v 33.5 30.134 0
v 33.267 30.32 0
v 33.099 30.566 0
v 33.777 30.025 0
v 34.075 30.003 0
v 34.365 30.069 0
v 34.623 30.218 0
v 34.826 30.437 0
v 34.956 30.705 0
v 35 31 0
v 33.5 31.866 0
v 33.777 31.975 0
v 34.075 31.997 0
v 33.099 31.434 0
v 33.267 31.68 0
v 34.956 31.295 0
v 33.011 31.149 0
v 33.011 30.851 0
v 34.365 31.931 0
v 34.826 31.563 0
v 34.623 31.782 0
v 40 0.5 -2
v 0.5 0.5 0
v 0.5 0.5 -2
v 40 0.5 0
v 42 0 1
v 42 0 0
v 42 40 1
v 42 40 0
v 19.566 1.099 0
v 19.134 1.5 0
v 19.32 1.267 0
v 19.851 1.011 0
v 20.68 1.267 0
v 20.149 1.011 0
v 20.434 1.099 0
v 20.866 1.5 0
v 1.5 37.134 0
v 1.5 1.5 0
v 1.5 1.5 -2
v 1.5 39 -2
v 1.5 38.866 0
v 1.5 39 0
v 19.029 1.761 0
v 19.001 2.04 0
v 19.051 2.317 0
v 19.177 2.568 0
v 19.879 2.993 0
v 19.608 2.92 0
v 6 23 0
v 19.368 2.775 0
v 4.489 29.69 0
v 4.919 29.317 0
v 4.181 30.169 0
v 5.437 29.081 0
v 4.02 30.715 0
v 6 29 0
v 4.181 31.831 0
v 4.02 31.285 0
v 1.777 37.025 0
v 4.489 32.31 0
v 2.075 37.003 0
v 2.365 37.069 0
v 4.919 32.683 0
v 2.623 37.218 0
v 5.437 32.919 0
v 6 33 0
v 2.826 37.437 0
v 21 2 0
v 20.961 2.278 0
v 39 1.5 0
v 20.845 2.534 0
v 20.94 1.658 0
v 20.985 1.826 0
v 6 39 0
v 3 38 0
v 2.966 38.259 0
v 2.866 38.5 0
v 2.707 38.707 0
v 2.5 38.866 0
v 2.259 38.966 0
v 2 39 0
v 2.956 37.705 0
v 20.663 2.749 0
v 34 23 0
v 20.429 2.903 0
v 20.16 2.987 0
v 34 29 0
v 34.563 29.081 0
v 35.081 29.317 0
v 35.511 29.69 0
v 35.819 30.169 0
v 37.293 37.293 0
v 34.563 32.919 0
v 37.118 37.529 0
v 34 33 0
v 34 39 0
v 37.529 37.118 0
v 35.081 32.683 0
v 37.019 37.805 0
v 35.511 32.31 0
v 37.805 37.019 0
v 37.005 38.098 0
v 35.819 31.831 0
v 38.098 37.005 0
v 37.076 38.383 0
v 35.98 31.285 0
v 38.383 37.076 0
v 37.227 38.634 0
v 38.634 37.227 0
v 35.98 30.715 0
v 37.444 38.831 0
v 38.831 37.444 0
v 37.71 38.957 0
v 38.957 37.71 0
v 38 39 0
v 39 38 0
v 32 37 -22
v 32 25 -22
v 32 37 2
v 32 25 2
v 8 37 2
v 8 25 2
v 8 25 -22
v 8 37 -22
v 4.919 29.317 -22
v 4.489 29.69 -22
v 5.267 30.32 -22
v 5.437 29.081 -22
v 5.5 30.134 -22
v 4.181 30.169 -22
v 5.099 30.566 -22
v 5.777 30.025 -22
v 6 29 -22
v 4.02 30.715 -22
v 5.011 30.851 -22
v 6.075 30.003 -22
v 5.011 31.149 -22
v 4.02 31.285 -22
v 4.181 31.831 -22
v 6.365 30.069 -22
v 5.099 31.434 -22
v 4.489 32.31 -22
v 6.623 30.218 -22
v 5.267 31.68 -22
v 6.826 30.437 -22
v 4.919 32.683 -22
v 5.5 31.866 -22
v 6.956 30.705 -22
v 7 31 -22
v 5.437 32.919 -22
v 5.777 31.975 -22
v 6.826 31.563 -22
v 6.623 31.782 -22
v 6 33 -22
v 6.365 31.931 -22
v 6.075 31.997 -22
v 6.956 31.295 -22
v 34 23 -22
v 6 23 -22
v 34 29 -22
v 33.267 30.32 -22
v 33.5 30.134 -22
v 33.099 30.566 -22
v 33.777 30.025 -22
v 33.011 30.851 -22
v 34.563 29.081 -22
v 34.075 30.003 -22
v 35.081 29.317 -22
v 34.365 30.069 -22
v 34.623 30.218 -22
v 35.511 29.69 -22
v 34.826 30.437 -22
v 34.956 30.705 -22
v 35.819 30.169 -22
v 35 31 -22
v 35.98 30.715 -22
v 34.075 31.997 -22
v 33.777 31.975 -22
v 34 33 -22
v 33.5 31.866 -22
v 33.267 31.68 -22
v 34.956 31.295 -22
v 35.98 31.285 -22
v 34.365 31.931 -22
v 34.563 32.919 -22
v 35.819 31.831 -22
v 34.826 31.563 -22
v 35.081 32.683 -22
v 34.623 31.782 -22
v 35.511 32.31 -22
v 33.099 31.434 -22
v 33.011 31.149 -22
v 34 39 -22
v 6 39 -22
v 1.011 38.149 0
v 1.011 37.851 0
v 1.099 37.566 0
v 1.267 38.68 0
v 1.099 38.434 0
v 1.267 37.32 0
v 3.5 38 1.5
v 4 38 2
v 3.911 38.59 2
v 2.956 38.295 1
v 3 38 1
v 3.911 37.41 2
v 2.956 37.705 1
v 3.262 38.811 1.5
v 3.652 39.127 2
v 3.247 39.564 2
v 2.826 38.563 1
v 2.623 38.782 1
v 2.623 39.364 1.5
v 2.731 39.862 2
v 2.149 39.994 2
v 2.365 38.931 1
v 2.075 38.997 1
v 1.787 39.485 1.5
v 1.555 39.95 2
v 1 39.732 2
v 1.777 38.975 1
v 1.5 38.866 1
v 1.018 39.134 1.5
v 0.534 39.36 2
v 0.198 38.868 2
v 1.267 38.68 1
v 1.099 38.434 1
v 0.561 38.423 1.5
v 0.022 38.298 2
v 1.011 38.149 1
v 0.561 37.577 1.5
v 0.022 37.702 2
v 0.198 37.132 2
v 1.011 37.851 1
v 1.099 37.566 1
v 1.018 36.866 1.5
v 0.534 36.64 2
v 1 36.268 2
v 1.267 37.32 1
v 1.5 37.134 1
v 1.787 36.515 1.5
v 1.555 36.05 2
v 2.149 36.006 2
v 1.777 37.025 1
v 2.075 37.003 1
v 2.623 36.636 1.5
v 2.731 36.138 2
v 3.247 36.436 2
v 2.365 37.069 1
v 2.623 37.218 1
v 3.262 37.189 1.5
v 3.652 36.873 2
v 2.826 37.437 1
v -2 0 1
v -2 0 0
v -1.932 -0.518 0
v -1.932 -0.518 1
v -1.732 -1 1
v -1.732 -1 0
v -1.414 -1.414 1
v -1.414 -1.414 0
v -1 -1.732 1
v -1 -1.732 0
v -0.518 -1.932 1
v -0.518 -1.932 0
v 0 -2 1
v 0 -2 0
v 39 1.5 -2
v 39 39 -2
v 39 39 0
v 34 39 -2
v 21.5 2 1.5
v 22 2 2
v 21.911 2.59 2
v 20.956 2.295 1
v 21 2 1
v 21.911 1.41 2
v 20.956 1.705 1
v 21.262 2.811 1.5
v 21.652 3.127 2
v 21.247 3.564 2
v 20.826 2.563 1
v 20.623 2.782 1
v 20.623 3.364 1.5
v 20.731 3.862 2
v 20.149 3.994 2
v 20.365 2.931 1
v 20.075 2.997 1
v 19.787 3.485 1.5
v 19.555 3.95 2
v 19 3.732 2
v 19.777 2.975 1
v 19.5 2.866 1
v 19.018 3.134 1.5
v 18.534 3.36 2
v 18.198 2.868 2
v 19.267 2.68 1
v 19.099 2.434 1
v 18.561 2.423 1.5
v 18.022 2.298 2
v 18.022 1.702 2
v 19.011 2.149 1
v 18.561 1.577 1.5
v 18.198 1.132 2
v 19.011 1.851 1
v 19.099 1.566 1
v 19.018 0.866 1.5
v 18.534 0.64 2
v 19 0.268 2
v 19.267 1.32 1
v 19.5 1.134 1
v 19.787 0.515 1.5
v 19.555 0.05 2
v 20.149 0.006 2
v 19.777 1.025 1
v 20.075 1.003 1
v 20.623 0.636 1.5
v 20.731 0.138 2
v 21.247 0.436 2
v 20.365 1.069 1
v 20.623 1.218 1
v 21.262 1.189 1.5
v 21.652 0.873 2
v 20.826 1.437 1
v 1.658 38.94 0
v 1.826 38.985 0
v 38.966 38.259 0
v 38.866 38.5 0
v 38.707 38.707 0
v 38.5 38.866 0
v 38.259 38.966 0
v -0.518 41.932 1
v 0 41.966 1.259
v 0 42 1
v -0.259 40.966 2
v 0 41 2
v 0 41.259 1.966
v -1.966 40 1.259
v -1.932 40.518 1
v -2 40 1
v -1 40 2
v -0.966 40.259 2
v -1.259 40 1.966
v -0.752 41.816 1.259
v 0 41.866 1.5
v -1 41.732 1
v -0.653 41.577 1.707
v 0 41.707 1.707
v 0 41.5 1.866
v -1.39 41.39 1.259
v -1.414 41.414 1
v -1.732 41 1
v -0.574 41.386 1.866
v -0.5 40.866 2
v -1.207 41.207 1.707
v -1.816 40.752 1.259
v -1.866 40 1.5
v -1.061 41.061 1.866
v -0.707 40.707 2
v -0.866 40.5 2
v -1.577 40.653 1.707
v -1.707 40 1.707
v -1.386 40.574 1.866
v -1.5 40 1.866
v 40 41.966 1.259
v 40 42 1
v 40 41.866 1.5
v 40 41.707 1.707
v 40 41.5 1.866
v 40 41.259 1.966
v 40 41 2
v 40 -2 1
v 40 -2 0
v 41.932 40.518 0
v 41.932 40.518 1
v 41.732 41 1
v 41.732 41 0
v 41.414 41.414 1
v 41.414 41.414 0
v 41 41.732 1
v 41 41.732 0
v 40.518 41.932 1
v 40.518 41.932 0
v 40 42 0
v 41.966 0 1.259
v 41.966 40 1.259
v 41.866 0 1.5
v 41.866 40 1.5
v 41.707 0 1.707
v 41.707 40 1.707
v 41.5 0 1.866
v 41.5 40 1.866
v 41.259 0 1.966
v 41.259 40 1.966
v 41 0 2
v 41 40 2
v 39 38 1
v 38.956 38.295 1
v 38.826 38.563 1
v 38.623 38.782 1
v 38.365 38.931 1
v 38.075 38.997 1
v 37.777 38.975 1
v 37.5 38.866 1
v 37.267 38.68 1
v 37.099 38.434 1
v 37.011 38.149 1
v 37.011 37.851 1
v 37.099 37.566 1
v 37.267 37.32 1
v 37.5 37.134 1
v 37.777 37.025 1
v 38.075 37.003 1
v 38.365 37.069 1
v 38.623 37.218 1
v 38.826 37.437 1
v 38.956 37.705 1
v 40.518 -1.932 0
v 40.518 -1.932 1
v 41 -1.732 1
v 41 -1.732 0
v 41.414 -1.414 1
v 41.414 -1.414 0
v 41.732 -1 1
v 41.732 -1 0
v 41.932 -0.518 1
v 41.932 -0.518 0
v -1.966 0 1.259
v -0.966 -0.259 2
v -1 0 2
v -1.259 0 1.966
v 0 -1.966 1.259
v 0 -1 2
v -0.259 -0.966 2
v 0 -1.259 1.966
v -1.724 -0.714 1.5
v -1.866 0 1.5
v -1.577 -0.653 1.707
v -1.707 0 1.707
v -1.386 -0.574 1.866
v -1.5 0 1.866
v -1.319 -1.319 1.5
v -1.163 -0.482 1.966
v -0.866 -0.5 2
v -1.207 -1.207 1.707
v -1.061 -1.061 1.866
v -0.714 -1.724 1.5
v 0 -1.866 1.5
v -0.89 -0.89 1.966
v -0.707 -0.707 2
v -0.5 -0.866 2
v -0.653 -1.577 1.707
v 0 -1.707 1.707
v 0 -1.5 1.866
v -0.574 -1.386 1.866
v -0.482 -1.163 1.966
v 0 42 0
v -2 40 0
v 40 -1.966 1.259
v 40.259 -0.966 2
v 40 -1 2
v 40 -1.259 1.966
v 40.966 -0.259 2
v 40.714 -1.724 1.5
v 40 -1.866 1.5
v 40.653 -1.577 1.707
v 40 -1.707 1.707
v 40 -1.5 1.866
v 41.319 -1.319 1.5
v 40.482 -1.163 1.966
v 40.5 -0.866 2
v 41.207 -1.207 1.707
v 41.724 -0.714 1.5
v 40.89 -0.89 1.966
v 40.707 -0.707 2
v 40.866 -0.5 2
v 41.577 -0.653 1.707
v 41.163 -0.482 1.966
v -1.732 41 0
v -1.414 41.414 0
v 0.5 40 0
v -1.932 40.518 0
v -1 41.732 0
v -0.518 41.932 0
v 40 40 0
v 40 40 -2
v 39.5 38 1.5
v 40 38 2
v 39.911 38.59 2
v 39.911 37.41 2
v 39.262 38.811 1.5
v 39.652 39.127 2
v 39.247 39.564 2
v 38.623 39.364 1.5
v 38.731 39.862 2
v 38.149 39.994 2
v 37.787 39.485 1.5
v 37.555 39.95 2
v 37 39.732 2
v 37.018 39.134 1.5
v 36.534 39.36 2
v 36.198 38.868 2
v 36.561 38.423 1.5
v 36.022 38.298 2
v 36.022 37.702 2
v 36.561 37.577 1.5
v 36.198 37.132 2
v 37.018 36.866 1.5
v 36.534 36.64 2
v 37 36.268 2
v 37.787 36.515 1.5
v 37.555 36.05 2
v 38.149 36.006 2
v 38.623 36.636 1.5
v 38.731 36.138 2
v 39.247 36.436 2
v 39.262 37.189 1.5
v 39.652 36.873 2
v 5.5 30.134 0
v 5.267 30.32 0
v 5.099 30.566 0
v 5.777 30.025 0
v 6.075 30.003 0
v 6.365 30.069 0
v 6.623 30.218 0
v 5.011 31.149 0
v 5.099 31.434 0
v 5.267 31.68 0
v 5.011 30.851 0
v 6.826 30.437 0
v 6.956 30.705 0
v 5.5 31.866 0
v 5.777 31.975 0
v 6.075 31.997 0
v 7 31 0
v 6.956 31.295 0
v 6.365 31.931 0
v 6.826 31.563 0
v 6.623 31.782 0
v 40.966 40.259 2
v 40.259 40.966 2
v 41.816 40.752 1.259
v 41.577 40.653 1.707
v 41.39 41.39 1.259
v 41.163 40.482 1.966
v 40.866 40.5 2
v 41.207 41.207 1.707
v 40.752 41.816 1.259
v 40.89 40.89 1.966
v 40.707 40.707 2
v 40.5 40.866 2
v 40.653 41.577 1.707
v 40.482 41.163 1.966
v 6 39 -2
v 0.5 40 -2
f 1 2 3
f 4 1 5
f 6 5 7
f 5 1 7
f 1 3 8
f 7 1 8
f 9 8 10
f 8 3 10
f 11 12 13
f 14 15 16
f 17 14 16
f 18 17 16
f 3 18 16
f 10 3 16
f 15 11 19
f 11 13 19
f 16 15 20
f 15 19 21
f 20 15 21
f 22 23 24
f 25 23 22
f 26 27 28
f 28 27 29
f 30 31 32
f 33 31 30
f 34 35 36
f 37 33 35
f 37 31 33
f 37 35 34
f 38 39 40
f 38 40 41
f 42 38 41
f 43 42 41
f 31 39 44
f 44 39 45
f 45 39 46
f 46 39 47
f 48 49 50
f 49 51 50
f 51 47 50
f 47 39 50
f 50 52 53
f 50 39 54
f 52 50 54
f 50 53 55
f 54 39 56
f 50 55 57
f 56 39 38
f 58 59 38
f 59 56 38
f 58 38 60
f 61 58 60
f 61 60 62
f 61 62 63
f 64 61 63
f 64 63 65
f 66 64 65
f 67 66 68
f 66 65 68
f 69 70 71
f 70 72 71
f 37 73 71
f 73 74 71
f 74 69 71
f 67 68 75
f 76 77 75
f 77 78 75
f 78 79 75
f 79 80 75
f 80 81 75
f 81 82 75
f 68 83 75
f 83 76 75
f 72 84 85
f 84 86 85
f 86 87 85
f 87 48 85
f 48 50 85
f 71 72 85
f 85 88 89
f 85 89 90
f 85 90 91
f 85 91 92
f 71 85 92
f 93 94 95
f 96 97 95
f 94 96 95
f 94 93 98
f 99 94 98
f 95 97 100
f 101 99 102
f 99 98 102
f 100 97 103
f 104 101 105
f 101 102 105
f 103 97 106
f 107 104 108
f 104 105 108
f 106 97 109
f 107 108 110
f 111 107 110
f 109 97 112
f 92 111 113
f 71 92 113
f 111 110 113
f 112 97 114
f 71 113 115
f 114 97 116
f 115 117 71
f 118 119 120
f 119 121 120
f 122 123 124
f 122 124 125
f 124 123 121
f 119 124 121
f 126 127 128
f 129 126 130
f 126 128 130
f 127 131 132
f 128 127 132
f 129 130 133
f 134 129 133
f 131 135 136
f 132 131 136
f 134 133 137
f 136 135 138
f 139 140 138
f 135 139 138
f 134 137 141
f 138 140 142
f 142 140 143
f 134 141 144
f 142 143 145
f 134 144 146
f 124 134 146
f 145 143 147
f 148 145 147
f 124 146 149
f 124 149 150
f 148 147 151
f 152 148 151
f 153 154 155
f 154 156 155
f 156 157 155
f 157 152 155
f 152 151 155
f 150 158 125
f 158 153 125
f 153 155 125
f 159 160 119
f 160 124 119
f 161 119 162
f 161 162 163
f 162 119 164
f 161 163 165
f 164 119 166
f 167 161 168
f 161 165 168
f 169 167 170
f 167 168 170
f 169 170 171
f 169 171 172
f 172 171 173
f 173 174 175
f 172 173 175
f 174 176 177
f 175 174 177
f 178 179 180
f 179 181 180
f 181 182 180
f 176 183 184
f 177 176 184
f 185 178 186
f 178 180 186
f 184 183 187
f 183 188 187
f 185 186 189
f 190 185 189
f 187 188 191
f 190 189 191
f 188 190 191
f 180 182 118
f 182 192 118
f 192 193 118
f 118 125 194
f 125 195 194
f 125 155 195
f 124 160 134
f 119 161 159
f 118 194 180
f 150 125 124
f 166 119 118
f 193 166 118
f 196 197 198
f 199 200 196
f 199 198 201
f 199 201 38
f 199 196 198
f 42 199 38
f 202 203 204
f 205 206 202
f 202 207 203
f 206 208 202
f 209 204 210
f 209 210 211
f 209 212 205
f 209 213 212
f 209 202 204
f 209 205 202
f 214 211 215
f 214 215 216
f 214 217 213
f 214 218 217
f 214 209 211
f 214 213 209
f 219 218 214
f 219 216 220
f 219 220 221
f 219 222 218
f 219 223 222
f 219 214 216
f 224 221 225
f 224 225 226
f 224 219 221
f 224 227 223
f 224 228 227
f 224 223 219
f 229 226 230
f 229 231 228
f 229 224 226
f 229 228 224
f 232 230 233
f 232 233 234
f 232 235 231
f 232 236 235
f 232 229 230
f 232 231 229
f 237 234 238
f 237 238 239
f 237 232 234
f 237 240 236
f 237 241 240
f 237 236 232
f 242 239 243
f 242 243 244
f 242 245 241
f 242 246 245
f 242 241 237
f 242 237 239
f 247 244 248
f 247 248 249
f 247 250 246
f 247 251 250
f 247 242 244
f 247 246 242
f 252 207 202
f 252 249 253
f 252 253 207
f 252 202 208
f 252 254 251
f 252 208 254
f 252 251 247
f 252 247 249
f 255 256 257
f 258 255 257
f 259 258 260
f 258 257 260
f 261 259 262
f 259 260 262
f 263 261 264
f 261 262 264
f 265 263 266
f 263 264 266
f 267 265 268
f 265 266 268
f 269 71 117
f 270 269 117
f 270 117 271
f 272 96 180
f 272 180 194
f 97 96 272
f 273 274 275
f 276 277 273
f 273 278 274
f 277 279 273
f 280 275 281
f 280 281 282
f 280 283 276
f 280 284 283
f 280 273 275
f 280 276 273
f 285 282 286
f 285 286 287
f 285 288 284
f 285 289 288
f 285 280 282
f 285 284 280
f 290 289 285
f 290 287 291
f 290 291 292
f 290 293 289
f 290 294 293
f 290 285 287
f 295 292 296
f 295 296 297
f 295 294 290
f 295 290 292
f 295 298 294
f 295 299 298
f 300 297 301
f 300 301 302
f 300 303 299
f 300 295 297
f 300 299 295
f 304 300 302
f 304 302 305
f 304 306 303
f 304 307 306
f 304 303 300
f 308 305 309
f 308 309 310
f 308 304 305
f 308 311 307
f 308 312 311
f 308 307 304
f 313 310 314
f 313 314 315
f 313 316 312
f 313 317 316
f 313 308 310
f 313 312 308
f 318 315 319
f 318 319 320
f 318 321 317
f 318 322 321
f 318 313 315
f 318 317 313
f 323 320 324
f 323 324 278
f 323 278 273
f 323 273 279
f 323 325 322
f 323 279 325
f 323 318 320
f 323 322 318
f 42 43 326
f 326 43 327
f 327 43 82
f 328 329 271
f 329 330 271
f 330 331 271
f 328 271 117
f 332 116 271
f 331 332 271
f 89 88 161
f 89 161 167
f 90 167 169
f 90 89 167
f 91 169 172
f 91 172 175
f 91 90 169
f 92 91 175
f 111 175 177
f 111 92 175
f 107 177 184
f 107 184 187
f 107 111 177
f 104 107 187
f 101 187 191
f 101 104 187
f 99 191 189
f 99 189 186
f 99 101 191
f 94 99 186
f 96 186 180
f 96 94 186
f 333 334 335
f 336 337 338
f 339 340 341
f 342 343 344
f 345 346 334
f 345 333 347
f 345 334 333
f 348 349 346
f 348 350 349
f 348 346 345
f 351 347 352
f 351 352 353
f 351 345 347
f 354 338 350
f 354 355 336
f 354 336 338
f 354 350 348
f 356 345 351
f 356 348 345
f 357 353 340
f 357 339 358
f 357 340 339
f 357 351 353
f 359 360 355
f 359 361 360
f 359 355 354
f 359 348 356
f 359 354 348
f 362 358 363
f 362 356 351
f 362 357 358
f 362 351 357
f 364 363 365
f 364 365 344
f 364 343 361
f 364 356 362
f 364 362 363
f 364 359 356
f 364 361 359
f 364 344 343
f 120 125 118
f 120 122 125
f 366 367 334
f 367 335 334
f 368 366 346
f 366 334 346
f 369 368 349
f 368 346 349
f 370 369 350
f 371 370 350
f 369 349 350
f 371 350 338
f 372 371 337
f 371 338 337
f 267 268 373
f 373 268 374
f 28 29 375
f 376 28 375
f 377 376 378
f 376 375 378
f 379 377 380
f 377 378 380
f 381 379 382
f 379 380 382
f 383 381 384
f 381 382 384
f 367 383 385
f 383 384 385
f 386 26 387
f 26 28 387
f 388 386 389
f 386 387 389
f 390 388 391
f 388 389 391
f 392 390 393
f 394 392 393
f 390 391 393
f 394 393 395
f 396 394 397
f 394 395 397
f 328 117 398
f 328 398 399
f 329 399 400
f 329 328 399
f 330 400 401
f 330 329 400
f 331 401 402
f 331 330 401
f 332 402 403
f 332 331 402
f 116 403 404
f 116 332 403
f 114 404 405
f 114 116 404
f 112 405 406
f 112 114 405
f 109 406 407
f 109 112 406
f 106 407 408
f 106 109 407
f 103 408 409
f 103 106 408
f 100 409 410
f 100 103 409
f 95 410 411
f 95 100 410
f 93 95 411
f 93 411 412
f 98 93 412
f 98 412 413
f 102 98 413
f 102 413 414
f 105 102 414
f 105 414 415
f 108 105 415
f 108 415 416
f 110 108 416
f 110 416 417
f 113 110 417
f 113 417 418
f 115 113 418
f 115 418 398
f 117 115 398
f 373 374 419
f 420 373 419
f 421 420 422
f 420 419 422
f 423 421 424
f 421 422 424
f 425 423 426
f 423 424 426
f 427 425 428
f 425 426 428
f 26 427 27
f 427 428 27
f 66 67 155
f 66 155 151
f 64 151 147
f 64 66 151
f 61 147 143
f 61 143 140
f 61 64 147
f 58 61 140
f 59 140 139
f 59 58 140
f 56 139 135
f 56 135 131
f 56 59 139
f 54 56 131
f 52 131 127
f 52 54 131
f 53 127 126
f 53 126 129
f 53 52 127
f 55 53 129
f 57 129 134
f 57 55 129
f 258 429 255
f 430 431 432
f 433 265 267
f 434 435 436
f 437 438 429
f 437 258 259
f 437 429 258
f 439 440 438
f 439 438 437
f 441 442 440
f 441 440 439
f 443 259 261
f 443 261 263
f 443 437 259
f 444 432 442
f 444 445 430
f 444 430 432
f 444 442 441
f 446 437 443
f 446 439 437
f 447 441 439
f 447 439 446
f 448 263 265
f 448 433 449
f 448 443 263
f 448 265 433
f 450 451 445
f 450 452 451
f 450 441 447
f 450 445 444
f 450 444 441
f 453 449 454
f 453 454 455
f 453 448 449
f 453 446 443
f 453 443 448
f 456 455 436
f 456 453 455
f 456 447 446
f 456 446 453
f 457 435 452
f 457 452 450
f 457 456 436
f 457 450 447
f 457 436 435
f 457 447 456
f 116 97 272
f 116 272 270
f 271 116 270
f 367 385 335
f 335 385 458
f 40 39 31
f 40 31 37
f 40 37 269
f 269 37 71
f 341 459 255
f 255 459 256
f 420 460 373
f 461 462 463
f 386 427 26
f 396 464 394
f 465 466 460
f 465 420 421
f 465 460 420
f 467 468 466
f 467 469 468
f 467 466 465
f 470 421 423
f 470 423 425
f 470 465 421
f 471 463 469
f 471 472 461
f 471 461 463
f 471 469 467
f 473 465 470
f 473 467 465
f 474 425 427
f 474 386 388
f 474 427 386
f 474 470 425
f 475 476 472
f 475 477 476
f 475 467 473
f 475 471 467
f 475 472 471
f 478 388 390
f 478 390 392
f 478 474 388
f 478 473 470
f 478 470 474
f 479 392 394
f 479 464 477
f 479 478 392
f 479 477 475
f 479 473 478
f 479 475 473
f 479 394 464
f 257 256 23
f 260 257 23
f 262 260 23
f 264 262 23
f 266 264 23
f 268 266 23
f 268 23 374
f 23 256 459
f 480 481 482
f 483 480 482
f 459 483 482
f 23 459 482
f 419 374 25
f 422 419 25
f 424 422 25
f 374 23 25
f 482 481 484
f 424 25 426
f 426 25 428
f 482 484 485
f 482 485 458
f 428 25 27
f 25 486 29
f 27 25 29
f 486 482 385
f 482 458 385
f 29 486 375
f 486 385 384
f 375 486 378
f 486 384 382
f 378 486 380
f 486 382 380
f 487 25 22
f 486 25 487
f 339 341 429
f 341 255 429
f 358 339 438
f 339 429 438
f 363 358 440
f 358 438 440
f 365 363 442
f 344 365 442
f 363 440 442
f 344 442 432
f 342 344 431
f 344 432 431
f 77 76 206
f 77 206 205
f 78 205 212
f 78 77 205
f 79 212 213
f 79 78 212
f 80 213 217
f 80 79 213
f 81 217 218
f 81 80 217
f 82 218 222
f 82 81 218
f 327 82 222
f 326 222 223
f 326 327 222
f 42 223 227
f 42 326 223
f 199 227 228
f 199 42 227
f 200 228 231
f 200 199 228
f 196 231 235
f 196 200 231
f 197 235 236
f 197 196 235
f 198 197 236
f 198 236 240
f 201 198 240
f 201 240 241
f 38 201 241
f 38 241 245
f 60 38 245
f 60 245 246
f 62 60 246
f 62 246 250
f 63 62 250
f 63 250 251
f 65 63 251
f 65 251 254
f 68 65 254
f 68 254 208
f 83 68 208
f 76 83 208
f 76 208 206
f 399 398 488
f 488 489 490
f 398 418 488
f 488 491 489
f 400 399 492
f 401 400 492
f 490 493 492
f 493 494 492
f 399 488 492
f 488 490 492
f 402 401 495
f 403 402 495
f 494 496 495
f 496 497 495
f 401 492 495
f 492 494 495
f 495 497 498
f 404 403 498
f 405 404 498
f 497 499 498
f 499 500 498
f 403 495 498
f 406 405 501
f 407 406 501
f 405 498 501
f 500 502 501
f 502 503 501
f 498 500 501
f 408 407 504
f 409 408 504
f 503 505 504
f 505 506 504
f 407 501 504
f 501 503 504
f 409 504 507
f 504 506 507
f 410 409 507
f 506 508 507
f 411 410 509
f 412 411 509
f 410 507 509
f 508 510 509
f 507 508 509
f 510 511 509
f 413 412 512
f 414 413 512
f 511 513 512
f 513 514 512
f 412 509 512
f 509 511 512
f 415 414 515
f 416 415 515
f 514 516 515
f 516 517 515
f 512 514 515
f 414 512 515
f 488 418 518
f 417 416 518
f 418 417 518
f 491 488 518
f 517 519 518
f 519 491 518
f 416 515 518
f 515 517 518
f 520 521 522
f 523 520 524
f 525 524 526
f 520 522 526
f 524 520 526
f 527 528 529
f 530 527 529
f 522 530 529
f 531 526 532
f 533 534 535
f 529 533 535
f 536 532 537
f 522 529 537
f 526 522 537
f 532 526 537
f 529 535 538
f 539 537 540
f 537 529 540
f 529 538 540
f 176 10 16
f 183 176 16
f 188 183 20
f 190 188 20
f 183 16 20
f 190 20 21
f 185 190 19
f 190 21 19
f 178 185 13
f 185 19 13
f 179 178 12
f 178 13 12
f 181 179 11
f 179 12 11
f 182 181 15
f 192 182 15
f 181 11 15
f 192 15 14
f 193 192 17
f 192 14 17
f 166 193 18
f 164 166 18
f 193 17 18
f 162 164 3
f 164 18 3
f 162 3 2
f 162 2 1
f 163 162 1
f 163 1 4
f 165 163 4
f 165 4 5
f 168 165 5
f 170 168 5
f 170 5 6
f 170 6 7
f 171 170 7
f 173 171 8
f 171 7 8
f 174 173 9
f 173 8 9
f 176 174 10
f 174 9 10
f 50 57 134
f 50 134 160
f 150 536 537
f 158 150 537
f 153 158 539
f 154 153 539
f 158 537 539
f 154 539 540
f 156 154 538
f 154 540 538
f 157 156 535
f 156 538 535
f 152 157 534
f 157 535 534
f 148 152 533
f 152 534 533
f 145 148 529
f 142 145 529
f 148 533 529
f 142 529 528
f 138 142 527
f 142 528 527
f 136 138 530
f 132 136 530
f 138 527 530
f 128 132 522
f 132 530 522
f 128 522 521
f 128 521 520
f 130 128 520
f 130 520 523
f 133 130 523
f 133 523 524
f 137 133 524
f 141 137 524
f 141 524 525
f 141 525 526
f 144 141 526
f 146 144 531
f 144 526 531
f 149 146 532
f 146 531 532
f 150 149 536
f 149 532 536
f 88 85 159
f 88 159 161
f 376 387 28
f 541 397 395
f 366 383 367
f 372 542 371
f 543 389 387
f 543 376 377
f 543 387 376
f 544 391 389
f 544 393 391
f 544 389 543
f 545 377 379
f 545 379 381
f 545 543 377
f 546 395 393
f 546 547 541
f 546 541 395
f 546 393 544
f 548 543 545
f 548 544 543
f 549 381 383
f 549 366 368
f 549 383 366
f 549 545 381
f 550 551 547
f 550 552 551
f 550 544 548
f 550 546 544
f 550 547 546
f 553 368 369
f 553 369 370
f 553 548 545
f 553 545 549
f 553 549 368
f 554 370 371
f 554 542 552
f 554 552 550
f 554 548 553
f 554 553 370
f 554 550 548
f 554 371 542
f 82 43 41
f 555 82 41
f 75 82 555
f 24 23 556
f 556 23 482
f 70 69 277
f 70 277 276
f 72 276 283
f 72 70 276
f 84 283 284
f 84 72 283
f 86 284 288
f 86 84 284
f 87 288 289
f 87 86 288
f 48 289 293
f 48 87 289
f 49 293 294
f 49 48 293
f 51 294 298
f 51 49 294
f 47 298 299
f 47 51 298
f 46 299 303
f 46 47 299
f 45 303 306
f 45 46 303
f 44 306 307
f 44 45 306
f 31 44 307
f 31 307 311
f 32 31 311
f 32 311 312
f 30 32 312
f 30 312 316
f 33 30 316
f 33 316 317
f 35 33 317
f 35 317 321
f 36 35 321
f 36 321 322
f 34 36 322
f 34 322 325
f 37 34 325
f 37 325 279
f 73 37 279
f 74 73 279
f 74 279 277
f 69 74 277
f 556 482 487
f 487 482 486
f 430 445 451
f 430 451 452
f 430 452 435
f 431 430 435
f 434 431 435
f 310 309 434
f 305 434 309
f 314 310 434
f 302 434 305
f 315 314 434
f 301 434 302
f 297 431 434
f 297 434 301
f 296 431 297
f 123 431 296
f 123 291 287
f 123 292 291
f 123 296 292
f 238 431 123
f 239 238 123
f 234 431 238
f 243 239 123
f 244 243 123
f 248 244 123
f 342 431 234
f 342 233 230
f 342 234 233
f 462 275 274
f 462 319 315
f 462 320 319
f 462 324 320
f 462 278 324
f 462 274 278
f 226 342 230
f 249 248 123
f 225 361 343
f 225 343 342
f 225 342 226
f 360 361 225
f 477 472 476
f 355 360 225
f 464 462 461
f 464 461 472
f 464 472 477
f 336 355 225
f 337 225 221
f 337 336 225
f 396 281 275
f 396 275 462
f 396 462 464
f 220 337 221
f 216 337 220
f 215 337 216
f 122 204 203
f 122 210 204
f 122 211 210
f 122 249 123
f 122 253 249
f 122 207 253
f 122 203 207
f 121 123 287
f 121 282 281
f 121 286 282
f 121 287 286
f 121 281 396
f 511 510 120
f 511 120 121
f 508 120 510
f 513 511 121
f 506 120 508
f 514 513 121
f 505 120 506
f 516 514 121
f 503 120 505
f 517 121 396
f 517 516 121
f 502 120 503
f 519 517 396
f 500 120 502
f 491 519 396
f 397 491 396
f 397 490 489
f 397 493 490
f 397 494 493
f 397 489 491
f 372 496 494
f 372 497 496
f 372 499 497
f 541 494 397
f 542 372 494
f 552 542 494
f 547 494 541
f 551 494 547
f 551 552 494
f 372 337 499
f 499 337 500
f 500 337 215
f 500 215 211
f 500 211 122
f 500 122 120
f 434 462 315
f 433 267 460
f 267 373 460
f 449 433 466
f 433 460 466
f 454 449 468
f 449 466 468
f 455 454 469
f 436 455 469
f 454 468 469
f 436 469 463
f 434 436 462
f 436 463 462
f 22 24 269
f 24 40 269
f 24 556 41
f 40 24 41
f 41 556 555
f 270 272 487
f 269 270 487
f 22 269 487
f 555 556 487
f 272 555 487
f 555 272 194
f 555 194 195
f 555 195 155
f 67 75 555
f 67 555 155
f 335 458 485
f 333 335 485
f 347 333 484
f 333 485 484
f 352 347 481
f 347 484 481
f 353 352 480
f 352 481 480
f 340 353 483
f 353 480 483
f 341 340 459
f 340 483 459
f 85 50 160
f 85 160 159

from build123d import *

# Parameters (mm, degrees)
SKETCH004_R      = 1
SKETCH004_W      = 24
SKETCH004_H      = 12
EXTRUDE003_DEPTH = 22
SKETCH006_W      = 39.5
SKETCH006_H      = 39.5
SKETCH006_W_2    = 37.5
SKETCH006_H_2    = 37.5
EXTRUDE004_DEPTH = 2
SKETCH003_R      = 1
SKETCH003_W      = 24
SKETCH003_H      = 12
EXTRUDE002_DEPTH = 2
FILLET001_R      = 1
CHAMFER_SIZE     = 1


with BuildPart() as extrude003:
    # Sketch004 → Extrude003 (new body)
    with BuildSketch(Plane.XY):
        with BuildLine():
            Line((34, 39), (6, 39))
            Line((6, 39), (6, 33))
            ThreePointArc((6, 33), (4, 31), (6, 29))
            Line((6, 29), (6, 23))
            Line((6, 23), (34, 23))
            Line((34, 23), (34, 29))
            ThreePointArc((34, 29), (36, 31), (34, 33))
            Line((34, 33), (34, 39))
        make_face()
        with Locations((6, 31)):
            Circle(SKETCH004_R, mode=Mode.SUBTRACT)
        with Locations((34, 31)):
            Circle(SKETCH004_R, mode=Mode.SUBTRACT)
        with Locations((20, 31)):
            Rectangle(SKETCH004_W, SKETCH004_H, mode=Mode.SUBTRACT)
    extrude(amount=-EXTRUDE003_DEPTH)


with BuildPart() as extrude004:
    # Sketch006 → Extrude004 (new body)
    with BuildSketch(Plane.XY):
        with Locations((20.25, 20.25)):
            Rectangle(SKETCH006_W, SKETCH006_H)
        with Locations((20.25, 20.25)):
            Rectangle(SKETCH006_W_2, SKETCH006_H_2, mode=Mode.SUBTRACT)
    extrude(amount=-EXTRUDE004_DEPTH)


with BuildPart() as chamfer_body:
    # Sketch003 → Extrude002 (new body)
    with BuildSketch(Plane.XY):
        with BuildLine():
            Line((0, -2), (40, -2))
            ThreePointArc((40, -2), (41.414214, -1.414214), (42, 0))
            Line((42, 0), (42, 40))
            ThreePointArc((42, 40), (41.414214, 41.414214), (40, 42))
            Line((40, 42), (0, 42))
            ThreePointArc((0, 42), (-1.414214, 41.414214), (-2, 40))
            Line((-2, 40), (-2, 0))
            ThreePointArc((-2, 0), (-1.414214, -1.414214), (0, -2))
        make_face()
        with Locations((2, 38)):
            Circle(SKETCH003_R, mode=Mode.SUBTRACT)
        with Locations((38, 38)):
            Circle(SKETCH003_R, mode=Mode.SUBTRACT)
        with Locations((20, 2)):
            Circle(SKETCH003_R, mode=Mode.SUBTRACT)
        with Locations((20, 31)):
            Rectangle(SKETCH003_W, SKETCH003_H, mode=Mode.SUBTRACT)
    extrude(amount=EXTRUDE002_DEPTH)

    # Fillet001
    fillet001_edges = [chamfer_body.edges().sort_by_distance(p)[0] for p in [
        (20, 42, 2),
    ]]
    fillet(fillet001_edges, radius=FILLET001_R)

    # Fusion001: union Extrude004
    add(extrude004.part)

    # Fusion002: union Extrude003
    add(extrude003.part)

    # Chamfer
    chamfer_edges = [chamfer_body.edges().sort_by_distance(p)[0] for p in [
        (19, 2, 2),
        (1, 38, 2),
        (37, 38, 2),
    ]]
    chamfer(chamfer_edges, length=CHAMFER_SIZE)


solid = chamfer_body.part
